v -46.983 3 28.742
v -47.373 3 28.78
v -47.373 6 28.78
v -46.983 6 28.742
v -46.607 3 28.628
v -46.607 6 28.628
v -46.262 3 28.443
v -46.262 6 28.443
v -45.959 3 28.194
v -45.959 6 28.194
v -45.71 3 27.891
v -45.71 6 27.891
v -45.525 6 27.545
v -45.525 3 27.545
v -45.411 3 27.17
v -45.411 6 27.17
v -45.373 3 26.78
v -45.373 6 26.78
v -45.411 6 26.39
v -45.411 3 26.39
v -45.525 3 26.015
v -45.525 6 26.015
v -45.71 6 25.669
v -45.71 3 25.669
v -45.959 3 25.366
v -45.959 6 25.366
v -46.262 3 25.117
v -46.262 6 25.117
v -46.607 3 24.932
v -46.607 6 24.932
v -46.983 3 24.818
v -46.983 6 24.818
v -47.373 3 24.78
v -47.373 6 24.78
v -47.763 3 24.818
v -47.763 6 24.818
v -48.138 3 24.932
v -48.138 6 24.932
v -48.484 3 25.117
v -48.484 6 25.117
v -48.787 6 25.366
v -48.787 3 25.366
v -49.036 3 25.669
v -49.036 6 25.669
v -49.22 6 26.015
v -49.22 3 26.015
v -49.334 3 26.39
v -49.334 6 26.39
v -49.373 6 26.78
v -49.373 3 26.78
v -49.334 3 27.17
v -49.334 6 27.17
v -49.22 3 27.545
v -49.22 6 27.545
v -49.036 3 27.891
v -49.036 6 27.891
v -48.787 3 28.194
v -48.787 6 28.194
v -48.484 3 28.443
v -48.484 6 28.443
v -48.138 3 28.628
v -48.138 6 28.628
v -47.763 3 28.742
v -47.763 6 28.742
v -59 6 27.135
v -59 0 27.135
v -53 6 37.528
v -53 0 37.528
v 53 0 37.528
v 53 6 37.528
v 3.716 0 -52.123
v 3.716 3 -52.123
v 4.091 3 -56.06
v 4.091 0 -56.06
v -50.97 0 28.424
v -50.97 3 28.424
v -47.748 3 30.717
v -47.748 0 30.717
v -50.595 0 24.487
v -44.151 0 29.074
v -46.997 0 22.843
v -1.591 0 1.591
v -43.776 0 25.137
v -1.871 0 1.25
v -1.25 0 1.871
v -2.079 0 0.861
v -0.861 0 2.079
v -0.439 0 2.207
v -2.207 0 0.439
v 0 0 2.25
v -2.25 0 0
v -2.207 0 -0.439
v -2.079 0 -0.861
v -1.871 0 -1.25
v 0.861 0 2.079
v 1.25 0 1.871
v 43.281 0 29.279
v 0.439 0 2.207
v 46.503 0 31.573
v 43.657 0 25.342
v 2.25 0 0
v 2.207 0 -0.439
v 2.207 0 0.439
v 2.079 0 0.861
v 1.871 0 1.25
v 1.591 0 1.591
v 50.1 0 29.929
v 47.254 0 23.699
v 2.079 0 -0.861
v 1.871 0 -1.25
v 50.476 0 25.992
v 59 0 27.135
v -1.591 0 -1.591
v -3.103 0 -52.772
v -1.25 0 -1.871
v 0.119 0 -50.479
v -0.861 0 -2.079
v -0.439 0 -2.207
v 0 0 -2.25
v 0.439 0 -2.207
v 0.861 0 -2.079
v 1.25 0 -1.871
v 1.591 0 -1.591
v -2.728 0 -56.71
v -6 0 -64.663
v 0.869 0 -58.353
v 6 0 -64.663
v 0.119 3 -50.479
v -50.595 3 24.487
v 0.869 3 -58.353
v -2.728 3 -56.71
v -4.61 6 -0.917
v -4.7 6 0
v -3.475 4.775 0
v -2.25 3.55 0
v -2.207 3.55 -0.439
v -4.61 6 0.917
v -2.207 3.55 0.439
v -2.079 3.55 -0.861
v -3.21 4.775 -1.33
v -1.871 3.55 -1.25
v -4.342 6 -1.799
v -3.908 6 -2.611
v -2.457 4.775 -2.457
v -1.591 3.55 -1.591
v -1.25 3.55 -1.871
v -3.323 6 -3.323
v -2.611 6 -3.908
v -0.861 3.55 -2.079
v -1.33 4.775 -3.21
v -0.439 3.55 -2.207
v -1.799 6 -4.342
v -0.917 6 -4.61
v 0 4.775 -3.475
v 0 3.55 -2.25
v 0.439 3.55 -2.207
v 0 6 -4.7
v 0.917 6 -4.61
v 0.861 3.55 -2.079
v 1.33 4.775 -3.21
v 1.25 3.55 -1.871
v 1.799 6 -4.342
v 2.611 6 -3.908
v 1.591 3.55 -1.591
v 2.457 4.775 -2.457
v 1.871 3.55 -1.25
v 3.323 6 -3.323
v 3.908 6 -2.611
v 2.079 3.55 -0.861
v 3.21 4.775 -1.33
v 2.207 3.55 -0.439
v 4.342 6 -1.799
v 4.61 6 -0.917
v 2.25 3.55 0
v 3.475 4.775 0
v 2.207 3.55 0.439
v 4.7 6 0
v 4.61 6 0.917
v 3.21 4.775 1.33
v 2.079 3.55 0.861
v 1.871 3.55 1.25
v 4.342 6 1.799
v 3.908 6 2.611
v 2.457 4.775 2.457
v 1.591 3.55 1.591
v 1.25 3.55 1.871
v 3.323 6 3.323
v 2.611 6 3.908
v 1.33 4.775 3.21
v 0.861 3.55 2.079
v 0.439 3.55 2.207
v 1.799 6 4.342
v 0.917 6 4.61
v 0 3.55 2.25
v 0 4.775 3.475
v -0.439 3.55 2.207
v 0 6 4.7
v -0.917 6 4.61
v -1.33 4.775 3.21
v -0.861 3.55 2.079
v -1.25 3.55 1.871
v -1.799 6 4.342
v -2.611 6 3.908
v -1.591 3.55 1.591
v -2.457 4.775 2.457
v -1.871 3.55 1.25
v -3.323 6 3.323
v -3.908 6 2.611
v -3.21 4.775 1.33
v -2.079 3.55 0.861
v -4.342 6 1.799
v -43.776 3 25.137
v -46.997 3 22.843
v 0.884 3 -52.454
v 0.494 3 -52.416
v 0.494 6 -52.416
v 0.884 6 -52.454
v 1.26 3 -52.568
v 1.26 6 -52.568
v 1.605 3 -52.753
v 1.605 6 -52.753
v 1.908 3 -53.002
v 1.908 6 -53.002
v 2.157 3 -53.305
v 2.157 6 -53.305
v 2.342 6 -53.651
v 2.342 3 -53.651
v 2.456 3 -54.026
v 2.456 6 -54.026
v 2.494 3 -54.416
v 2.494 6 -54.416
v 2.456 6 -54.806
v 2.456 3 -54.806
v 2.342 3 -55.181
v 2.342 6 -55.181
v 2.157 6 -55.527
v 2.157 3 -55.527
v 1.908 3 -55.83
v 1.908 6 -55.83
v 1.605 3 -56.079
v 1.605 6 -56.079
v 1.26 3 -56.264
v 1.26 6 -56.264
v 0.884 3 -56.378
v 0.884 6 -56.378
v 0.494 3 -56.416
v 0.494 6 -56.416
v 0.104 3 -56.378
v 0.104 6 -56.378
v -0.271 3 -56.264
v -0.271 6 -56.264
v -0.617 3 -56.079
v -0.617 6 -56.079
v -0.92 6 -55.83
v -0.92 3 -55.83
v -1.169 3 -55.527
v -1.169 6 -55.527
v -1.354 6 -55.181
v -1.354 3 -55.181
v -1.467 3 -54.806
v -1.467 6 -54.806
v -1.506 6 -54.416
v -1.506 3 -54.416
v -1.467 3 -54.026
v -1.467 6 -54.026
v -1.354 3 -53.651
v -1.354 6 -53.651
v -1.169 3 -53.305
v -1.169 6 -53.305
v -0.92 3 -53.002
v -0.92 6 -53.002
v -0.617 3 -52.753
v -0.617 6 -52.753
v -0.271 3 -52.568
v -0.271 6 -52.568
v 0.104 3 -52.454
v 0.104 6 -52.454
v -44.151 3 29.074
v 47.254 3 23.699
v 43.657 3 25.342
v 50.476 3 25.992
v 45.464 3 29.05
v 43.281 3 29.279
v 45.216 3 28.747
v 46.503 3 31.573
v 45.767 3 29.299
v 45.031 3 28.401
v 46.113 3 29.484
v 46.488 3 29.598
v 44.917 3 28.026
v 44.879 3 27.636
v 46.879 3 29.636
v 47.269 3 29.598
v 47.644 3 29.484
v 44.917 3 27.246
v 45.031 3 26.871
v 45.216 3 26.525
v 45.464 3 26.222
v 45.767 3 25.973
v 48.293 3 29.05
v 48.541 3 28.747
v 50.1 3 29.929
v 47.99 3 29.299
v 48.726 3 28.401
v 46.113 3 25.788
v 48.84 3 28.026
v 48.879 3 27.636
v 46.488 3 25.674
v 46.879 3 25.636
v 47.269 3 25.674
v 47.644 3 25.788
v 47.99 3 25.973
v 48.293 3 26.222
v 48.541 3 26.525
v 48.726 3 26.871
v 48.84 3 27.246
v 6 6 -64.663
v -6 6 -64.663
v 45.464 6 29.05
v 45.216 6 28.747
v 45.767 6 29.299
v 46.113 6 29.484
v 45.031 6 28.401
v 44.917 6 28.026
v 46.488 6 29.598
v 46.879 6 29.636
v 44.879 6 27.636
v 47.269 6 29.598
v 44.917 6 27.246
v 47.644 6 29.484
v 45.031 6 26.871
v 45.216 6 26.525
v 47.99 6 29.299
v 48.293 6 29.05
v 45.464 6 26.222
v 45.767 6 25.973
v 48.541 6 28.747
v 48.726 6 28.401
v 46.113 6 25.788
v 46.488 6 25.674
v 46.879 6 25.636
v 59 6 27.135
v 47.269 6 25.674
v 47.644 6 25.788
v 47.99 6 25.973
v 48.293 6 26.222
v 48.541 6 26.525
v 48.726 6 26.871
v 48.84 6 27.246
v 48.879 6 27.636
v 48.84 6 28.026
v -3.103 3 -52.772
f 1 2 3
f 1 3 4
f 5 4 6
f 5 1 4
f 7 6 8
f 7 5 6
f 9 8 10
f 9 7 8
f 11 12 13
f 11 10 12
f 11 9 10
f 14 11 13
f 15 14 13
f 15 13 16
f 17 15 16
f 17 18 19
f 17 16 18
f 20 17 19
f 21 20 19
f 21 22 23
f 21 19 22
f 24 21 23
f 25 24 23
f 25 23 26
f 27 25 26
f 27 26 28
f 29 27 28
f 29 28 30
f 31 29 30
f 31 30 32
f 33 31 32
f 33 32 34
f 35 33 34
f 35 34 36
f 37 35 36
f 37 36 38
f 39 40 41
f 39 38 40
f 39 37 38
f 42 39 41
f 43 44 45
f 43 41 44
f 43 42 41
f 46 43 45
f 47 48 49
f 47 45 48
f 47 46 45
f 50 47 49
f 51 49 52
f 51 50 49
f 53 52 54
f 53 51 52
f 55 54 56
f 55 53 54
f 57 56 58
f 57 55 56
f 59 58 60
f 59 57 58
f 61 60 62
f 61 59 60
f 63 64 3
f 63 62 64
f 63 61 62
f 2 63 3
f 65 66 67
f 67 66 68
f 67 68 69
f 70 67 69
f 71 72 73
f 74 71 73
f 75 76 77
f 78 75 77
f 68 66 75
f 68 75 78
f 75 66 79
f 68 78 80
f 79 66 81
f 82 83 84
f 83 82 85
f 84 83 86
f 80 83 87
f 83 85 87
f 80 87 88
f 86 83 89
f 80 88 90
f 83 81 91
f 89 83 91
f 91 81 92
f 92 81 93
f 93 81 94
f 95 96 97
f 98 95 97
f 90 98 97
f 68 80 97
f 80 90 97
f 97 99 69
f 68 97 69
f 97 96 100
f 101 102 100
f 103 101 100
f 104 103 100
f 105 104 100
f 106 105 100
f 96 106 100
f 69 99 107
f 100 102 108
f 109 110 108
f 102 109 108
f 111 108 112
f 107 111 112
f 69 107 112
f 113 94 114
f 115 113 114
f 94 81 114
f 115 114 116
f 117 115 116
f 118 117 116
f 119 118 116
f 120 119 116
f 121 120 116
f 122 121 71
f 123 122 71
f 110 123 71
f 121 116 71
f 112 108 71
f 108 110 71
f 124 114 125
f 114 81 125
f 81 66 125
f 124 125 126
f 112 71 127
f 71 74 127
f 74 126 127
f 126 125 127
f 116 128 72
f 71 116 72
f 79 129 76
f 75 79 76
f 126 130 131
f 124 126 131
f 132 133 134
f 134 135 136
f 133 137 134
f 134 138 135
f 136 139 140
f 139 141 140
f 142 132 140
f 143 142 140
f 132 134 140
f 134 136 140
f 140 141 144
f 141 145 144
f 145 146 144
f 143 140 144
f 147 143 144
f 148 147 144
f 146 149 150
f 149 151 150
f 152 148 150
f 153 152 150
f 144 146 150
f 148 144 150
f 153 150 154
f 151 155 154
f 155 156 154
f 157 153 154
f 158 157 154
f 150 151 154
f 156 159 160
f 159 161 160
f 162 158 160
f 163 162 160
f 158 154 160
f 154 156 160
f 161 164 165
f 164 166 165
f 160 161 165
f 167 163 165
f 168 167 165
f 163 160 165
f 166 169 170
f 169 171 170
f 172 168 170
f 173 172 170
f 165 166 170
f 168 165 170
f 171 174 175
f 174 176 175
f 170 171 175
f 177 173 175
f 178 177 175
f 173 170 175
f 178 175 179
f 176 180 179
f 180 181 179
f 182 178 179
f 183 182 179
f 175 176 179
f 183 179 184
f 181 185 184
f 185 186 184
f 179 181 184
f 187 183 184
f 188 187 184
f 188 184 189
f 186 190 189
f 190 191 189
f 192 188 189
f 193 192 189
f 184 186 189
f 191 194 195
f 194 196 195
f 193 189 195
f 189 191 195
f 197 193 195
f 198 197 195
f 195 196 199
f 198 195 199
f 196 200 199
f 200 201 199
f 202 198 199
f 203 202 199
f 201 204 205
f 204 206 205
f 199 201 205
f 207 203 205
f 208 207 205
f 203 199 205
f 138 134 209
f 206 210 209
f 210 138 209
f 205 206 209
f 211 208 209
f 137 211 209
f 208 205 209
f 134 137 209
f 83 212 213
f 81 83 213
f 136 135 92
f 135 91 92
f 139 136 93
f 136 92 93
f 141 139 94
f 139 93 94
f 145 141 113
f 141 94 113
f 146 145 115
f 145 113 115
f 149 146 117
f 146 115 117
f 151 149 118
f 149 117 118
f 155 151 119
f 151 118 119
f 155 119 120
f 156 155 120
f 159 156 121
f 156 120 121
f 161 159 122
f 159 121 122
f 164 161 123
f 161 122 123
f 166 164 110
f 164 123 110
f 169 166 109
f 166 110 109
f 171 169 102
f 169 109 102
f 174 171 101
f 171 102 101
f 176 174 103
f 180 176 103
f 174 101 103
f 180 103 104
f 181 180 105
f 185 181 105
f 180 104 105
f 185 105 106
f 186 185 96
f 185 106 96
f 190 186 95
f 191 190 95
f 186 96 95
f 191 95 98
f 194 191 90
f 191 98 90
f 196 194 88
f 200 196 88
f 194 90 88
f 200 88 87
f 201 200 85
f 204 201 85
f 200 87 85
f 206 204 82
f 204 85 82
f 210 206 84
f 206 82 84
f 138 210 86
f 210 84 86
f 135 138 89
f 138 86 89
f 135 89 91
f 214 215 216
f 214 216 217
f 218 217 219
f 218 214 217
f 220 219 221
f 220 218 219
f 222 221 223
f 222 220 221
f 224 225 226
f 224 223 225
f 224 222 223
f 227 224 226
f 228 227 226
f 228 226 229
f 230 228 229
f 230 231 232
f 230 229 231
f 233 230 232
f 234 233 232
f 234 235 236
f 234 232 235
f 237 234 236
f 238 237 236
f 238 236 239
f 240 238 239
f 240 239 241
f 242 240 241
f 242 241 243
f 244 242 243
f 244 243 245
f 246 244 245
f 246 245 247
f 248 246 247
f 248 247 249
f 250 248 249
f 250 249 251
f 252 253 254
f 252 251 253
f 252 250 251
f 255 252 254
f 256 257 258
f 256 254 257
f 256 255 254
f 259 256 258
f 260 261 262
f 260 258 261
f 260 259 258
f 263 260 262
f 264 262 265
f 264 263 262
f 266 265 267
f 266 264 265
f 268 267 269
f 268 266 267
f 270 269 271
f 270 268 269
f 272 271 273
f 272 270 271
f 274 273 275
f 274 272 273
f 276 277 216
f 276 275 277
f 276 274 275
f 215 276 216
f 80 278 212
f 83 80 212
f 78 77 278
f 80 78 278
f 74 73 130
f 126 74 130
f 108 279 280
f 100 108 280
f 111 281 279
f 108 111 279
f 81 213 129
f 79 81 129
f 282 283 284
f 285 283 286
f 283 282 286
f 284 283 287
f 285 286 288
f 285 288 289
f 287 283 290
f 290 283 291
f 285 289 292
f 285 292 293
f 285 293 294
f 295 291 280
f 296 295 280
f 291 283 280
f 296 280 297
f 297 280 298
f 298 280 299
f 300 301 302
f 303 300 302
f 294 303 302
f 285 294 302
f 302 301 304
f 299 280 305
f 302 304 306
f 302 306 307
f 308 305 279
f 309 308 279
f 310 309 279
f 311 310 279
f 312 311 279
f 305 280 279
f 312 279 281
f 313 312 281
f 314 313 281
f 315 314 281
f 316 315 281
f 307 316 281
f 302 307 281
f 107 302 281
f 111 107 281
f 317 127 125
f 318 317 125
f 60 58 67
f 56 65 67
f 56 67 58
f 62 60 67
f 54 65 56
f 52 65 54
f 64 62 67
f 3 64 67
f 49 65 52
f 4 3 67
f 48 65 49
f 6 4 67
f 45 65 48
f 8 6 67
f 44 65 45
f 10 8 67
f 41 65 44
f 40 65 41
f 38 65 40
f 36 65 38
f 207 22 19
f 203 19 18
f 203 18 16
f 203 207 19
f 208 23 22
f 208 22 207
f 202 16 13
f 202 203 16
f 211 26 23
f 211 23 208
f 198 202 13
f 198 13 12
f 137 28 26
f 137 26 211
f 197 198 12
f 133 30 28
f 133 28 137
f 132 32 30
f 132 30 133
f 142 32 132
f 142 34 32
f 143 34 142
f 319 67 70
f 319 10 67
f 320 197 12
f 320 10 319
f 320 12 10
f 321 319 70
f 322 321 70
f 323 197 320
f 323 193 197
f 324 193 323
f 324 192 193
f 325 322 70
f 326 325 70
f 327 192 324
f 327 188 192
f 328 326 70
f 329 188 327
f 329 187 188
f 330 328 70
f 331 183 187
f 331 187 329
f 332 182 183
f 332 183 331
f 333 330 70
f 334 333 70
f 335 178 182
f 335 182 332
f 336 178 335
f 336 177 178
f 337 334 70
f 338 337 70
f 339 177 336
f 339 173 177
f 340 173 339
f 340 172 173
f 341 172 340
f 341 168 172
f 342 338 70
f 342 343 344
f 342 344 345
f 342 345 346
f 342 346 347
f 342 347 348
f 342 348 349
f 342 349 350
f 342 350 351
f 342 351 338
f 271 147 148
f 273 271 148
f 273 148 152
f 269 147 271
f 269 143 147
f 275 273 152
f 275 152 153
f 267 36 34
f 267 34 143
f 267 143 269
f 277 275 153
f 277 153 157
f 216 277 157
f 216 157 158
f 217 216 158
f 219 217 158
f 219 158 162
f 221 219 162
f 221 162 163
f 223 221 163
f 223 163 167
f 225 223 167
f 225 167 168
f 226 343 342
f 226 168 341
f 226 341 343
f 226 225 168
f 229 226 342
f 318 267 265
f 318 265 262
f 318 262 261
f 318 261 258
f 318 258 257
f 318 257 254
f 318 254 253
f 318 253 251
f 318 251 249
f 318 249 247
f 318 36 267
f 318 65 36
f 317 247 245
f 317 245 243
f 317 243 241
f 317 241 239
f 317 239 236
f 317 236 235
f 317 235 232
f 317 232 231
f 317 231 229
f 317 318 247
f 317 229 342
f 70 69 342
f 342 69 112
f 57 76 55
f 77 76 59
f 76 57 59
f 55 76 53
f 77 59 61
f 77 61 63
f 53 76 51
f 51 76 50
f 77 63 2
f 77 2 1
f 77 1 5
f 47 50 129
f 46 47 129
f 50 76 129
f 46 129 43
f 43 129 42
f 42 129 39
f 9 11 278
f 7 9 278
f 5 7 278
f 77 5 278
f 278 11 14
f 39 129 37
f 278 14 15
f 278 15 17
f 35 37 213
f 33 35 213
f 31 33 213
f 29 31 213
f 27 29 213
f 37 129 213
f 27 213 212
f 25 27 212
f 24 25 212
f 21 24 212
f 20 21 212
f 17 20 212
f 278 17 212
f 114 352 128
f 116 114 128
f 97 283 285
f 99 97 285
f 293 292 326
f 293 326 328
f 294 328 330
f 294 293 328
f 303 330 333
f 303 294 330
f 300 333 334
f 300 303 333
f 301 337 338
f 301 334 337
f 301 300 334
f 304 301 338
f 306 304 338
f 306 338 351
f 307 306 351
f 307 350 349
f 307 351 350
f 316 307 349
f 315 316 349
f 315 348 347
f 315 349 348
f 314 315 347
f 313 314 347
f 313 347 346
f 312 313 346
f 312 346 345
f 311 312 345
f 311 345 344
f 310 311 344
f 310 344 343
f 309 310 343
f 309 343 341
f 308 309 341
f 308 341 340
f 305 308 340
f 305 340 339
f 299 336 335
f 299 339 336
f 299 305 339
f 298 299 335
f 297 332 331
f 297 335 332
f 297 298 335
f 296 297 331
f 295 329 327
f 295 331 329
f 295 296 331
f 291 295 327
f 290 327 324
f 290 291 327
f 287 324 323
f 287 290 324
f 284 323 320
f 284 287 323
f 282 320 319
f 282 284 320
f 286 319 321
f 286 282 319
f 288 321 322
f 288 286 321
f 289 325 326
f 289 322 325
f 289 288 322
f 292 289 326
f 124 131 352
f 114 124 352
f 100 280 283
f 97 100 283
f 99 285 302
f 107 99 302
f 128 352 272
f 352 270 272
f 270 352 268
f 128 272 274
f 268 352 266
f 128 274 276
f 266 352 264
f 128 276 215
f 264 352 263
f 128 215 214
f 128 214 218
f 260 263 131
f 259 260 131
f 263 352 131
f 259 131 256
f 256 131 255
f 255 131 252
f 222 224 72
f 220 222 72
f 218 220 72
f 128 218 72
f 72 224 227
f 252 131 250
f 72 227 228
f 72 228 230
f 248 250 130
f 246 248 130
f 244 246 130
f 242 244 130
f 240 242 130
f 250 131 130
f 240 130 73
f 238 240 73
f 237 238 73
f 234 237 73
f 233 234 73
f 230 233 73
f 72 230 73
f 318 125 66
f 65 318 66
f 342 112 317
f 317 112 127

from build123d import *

# Parameters (mm, degrees)
BOSS_EXTRUDE1_DEPTH                             = 6
CSK_FOR_M4_FLAT_HEAD_MACHINE_SCREW1_D           = 4.5
CSK_FOR_M4_FLAT_HEAD_MACHINE_SCREW1_CSINK_D     = 9.4
CSK_FOR_M4_FLAT_HEAD_MACHINE_SCREW1_CSINK_ANGLE = 90
CUT_EXTRUDE1_DEPTH                              = 88.740146645
CUT_EXTRUDE1_DEPTH_BACK                         = 88.740146645
SKETCH3_R                                       = 2
CUT_EXTRUDE3_START                              = -3
CUT_EXTRUDE3_DEPTH                              = 10


with BuildPart() as part:
    # Sketch2 → Boss-Extrude1 (new body)
    with BuildSketch(Plane(origin=(0, 0, 0), x_dir=(1, 0, 0), z_dir=(0, 1, 0))):
        Polygon((-6, 64.663230149), (-59, -27.135462652), (-53, -37.527767497), (53, -37.527767497), (59, -27.135462652), (6, 64.663230149), align=None)
    extrude(amount=BOSS_EXTRUDE1_DEPTH)

    # CSK for M4 Flat Head Machine Screw1 (through all)
    with Locations(Plane(origin=(0, 6, 0), x_dir=(1, 0, 0), z_dir=(0, 1, 0))):
        with Locations((0, 0)):
            CounterSinkHole(CSK_FOR_M4_FLAT_HEAD_MACHINE_SCREW1_D / 2, CSK_FOR_M4_FLAT_HEAD_MACHINE_SCREW1_CSINK_D / 2, counter_sink_angle=CSK_FOR_M4_FLAT_HEAD_MACHINE_SCREW1_CSINK_ANGLE)

    # Sketch3 → Cut-Extrude1 (cut, two sides: drawn at the far end of the back side and taken through both)
    with BuildSketch(Plane(origin=(0, 6, 0), x_dir=(1, 0, 0), z_dir=(0, 1, 0)).offset(-CUT_EXTRUDE1_DEPTH_BACK)):
        with Locations(Location((-47.372740925, -26.780019623, 0), (0, 0, 270))):
            Circle(SKETCH3_R)
        with Locations(Location((0.494193155, 54.416006899, 0), (0, 0, 270))):
            Circle(SKETCH3_R)
        with Locations(Location((46.87854777, -27.635987277, 0), (0, 0, 270))):
            Circle(SKETCH3_R)
    extrude(amount=CUT_EXTRUDE1_DEPTH + CUT_EXTRUDE1_DEPTH_BACK, mode=Mode.SUBTRACT)

    # Sketch7 → Cut-Extrude3 (cut)
    with BuildSketch(Plane(origin=(0, 6, 0), x_dir=(1, 0, 0), z_dir=(0, 1, 0)).offset(CUT_EXTRUDE3_START)):
        Polygon((-43.775560598, -25.136509042), (-46.997472676, -22.843014787), (-50.594653003, -24.486525368), (-50.969921252, -28.423530203), (-47.748009174, -30.717024458), (-44.150828847, -29.073513878), align=None)
        Polygon((3.716105233, 52.122512644), (4.091373482, 56.05951748), (0.869461405, 58.353011735), (-2.727718922, 56.709501154), (-3.102987172, 52.772496319), (0.118924906, 50.479002064), align=None)
        Polygon((43.281367443, -29.279497857), (46.50327952, -31.572992112), (50.100459847, -29.929481531), (50.475728097, -25.992476696), (47.253816019, -23.698982441), (43.656635692, -25.342493022), align=None)
    extrude(amount=-CUT_EXTRUDE3_DEPTH, mode=Mode.SUBTRACT)


solid = part.part
